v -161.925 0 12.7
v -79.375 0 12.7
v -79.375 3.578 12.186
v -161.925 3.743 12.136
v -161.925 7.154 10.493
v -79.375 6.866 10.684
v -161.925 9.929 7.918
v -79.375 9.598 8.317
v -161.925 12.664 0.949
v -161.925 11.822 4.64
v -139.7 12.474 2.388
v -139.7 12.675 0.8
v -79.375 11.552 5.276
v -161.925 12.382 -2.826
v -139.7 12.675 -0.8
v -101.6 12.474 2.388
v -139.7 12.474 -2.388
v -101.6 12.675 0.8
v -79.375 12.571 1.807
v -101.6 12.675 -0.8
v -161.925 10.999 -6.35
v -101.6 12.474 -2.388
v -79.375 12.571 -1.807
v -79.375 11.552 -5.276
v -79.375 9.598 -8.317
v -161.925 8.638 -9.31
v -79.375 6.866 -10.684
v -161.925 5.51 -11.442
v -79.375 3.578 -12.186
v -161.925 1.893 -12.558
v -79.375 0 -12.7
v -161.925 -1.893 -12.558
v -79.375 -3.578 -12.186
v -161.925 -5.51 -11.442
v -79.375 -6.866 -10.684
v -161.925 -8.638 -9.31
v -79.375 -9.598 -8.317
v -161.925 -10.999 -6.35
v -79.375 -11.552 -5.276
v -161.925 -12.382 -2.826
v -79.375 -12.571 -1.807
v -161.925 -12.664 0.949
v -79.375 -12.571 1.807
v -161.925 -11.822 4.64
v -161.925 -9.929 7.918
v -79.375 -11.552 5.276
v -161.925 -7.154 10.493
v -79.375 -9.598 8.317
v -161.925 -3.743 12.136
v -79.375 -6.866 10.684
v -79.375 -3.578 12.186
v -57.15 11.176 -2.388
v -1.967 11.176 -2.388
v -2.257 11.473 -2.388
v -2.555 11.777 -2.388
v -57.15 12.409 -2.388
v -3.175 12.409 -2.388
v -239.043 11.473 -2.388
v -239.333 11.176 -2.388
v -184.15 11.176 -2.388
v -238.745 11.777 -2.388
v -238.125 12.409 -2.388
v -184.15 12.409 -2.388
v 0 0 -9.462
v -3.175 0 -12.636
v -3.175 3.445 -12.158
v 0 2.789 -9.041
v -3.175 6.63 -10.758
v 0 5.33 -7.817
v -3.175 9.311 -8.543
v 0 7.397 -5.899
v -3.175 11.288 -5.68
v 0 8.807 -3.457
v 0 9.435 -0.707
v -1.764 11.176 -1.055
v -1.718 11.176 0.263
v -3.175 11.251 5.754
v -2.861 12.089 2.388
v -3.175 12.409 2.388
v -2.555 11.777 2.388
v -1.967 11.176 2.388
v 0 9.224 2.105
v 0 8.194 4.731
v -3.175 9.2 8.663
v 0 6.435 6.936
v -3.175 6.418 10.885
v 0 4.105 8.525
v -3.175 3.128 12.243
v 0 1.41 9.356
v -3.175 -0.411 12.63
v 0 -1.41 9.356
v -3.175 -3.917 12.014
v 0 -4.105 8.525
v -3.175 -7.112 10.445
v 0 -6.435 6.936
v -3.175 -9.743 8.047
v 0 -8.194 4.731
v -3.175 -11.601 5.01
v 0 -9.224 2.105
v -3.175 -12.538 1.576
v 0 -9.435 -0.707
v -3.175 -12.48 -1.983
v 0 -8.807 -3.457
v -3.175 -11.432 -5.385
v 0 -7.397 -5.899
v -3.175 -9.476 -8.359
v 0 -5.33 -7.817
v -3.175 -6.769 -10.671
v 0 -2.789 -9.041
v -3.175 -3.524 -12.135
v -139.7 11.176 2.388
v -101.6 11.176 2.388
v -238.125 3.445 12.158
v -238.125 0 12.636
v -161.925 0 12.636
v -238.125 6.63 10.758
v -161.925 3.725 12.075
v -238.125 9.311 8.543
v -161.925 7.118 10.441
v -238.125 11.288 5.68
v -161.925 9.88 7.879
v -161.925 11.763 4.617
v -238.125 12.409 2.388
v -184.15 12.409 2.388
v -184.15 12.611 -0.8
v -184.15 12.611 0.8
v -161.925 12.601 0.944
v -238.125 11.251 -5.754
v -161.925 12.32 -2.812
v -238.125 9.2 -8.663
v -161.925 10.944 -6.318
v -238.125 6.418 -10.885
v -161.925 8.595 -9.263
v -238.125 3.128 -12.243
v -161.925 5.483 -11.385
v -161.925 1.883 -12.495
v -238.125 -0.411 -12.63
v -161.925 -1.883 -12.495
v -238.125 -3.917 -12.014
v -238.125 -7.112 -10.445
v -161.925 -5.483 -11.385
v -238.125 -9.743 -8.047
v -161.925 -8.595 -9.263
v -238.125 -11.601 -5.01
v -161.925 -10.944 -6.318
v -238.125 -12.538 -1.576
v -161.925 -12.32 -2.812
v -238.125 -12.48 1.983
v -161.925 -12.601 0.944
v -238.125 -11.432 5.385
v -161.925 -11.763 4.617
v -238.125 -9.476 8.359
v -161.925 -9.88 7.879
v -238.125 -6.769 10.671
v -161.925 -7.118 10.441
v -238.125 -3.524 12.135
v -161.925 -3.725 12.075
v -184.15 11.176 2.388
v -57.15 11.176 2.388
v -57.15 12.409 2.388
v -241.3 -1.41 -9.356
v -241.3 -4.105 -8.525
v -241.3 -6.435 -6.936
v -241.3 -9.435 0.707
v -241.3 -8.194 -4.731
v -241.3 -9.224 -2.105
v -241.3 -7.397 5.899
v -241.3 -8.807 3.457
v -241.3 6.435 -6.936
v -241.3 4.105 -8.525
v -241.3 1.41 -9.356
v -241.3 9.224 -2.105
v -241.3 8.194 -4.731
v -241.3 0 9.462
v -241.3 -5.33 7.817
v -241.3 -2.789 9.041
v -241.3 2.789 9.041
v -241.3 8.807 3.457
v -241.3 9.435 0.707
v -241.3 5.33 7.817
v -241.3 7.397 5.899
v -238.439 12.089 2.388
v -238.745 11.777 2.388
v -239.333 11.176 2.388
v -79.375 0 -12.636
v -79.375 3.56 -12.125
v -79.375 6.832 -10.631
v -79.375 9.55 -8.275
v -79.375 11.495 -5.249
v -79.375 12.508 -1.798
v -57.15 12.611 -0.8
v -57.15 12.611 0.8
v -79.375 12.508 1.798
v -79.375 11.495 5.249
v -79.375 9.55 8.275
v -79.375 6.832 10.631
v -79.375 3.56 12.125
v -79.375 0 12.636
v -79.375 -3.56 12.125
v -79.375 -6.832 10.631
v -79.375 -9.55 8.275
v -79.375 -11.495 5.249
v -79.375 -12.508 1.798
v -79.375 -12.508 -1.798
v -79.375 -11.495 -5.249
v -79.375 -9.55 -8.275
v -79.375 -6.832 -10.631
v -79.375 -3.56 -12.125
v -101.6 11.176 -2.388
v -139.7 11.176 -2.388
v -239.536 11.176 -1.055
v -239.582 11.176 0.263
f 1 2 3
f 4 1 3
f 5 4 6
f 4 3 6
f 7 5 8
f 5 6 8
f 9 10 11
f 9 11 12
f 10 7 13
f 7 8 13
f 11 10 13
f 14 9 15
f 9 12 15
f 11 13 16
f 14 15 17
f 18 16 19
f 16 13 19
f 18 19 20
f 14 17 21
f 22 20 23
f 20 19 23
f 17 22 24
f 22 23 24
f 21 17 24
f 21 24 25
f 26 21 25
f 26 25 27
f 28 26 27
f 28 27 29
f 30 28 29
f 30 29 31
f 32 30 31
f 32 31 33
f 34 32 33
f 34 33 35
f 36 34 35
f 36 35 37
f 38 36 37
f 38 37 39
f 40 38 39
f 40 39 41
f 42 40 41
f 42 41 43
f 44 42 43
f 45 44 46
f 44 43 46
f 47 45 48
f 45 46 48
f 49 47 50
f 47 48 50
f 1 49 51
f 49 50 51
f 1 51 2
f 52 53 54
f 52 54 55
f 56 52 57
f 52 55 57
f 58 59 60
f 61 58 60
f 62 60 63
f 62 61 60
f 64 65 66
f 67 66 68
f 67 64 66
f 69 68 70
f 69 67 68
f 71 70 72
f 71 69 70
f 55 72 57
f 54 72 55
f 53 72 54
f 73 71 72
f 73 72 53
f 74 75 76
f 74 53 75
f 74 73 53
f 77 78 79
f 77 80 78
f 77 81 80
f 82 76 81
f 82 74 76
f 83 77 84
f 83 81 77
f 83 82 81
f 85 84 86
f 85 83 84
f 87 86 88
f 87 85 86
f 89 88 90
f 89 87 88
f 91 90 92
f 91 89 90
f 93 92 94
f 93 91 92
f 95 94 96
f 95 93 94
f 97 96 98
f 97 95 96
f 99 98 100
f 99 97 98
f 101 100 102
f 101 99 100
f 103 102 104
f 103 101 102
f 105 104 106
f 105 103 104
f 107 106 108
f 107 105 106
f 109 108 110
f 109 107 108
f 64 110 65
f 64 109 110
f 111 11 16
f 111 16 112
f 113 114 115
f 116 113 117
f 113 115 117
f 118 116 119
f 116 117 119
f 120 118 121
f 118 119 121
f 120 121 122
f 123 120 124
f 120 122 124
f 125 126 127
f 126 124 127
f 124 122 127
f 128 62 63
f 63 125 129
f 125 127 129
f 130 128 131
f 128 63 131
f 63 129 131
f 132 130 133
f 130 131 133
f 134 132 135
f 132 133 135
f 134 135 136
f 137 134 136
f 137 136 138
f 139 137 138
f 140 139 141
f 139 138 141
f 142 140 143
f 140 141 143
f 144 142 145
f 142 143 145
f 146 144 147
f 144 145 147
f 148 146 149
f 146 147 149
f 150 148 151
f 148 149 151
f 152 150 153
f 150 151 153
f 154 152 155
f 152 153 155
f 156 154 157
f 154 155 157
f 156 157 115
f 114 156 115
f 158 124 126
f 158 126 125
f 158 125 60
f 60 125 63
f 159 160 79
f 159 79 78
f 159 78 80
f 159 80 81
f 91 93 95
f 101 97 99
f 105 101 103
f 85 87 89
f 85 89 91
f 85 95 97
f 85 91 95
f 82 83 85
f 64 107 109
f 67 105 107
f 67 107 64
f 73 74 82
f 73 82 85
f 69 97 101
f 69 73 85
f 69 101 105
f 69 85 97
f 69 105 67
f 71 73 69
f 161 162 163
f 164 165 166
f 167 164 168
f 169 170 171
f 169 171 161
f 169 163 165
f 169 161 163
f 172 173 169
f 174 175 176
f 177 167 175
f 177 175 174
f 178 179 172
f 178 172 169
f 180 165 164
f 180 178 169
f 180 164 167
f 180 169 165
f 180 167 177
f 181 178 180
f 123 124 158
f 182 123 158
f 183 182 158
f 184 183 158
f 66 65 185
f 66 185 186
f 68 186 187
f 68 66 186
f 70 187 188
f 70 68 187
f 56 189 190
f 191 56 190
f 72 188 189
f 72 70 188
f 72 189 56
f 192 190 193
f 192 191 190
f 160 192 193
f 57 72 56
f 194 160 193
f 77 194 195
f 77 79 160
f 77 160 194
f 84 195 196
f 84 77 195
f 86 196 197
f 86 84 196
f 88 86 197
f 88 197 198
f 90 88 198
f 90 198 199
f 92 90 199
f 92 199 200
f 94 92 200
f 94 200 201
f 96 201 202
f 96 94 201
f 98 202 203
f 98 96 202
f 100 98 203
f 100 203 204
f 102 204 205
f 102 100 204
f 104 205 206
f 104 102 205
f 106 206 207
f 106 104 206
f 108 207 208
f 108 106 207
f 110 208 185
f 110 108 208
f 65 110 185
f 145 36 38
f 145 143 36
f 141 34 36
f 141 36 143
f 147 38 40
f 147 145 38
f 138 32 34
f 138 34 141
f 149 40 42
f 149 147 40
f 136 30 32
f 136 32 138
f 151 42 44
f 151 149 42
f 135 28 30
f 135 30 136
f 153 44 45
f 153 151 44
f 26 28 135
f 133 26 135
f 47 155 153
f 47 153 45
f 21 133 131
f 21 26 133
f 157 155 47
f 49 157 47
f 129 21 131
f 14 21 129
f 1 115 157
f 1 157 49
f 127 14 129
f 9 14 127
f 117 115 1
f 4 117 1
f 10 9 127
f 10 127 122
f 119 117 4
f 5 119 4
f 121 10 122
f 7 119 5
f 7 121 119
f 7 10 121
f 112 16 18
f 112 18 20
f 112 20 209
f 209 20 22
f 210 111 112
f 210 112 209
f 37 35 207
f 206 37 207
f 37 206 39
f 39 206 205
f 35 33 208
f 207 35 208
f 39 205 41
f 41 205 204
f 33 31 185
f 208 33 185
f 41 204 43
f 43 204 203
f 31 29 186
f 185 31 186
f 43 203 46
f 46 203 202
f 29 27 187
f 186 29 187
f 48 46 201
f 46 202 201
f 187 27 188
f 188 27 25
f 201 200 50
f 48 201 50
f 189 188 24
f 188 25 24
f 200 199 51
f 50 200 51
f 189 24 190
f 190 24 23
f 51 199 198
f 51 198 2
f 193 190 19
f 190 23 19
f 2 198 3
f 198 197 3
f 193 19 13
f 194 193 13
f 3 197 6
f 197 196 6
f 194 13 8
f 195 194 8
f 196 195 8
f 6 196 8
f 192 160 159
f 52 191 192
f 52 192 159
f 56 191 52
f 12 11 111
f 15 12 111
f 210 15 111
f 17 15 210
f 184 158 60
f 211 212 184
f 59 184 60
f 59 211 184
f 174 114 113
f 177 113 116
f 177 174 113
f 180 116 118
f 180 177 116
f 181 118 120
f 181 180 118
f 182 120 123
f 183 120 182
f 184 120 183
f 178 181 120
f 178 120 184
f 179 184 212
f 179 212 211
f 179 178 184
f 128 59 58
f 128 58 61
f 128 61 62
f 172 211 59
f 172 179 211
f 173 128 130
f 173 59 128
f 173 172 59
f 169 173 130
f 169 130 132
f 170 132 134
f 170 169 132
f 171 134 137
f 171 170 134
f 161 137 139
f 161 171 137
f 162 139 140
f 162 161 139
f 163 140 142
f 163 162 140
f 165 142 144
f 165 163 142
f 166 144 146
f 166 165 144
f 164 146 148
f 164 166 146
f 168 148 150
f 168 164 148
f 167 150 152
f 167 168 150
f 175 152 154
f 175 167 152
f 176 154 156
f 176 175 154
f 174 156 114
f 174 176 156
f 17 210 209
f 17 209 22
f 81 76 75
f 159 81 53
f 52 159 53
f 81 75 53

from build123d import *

# Parameters (mm, degrees)
SKETCH1_R           = 12.6365
BOSS_EXTRUDE1_DEPTH = 79.375
SKETCH2_R           = 12.7
BOSS_EXTRUDE2_DEPTH = 82.55
SKETCH3_R           = 12.6365
BOSS_EXTRUDE3_DEPTH = 79.375
CHAMFER1_SIZE       = 3.175
CUT_EXTRUDE1_DEPTH  = 57.15
CUT_EXTRUDE2_START  = -241.3
CUT_EXTRUDE2_DEPTH  = 57.15
CUT_EXTRUDE3_START  = -120.65
CUT_EXTRUDE3_DEPTH  = 19.05


with BuildPart() as part:
    # Sketch1 → Boss-Extrude1 (new body)
    with BuildSketch(Plane(origin=(0, 0, 0), x_dir=(0, 0, -1), z_dir=(1, 0, 0))):
        Circle(SKETCH1_R)
    extrude(amount=-BOSS_EXTRUDE1_DEPTH)

    # Sketch2 → Boss-Extrude2 (add)
    with BuildSketch(Plane.ZY.offset(79.375)):
        Circle(SKETCH2_R)
    extrude(amount=BOSS_EXTRUDE2_DEPTH)

    # Sketch3 → Boss-Extrude3 (add)
    with BuildSketch(Plane.ZY.offset(161.925)):
        Circle(SKETCH3_R)
    extrude(amount=BOSS_EXTRUDE3_DEPTH)

    # Chamfer1
    chamfer1_edges = [part.edges().sort_by_distance(p)[0] for p in [
        (-241.3, 0, -12.6365),
        (0, 0, 12.6365),
    ]]
    chamfer(chamfer1_edges, length=CHAMFER1_SIZE)

    # Sketch4 → Cut-Extrude1 (cut)
    with BuildSketch(Plane(origin=(0, 0, 0), x_dir=(0, 0, -1), z_dir=(1, 0, 0))):
        with BuildLine():
            Line((-2.3876, 11.176), (2.3876, 11.176))
            Line((2.3876, 11.176), (2.3876, 12.473546658))
            ThreePointArc((2.3876, 12.473546658), (0, 12.7), (-2.3876, 12.473546658))
            Line((-2.3876, 12.473546658), (-2.3876, 11.176))
        make_face()
    extrude(amount=-CUT_EXTRUDE1_DEPTH, mode=Mode.SUBTRACT)

    # Sketch4<2> → Cut-Extrude2 (cut)
    with BuildSketch(Plane(origin=(0, 0, 0), x_dir=(0, 0, -1), z_dir=(1, 0, 0)).offset(CUT_EXTRUDE2_START)):
        with BuildLine():
            Line((-2.3876, 11.176), (2.3876, 11.176))
            Line((2.3876, 11.176), (2.3876, 12.473546658))
            ThreePointArc((2.3876, 12.473546658), (0, 12.7), (-2.3876, 12.473546658))
            Line((-2.3876, 12.473546658), (-2.3876, 11.176))
        make_face()
    extrude(amount=CUT_EXTRUDE2_DEPTH, mode=Mode.SUBTRACT)

    # Sketch4<4> → Cut-Extrude3 (cut, symmetric)
    with BuildSketch(Plane(origin=(0, 0, 0), x_dir=(0, 0, -1), z_dir=(1, 0, 0)).offset(CUT_EXTRUDE3_START)):
        with BuildLine():
            Line((-2.3876, 11.176), (2.3876, 11.176))
            Line((2.3876, 11.176), (2.3876, 12.473546658))
            ThreePointArc((2.3876, 12.473546658), (0, 12.7), (-2.3876, 12.473546658))
            Line((-2.3876, 12.473546658), (-2.3876, 11.176))
        make_face()
    extrude(amount=CUT_EXTRUDE3_DEPTH, both=True, mode=Mode.SUBTRACT)


solid = part.part
